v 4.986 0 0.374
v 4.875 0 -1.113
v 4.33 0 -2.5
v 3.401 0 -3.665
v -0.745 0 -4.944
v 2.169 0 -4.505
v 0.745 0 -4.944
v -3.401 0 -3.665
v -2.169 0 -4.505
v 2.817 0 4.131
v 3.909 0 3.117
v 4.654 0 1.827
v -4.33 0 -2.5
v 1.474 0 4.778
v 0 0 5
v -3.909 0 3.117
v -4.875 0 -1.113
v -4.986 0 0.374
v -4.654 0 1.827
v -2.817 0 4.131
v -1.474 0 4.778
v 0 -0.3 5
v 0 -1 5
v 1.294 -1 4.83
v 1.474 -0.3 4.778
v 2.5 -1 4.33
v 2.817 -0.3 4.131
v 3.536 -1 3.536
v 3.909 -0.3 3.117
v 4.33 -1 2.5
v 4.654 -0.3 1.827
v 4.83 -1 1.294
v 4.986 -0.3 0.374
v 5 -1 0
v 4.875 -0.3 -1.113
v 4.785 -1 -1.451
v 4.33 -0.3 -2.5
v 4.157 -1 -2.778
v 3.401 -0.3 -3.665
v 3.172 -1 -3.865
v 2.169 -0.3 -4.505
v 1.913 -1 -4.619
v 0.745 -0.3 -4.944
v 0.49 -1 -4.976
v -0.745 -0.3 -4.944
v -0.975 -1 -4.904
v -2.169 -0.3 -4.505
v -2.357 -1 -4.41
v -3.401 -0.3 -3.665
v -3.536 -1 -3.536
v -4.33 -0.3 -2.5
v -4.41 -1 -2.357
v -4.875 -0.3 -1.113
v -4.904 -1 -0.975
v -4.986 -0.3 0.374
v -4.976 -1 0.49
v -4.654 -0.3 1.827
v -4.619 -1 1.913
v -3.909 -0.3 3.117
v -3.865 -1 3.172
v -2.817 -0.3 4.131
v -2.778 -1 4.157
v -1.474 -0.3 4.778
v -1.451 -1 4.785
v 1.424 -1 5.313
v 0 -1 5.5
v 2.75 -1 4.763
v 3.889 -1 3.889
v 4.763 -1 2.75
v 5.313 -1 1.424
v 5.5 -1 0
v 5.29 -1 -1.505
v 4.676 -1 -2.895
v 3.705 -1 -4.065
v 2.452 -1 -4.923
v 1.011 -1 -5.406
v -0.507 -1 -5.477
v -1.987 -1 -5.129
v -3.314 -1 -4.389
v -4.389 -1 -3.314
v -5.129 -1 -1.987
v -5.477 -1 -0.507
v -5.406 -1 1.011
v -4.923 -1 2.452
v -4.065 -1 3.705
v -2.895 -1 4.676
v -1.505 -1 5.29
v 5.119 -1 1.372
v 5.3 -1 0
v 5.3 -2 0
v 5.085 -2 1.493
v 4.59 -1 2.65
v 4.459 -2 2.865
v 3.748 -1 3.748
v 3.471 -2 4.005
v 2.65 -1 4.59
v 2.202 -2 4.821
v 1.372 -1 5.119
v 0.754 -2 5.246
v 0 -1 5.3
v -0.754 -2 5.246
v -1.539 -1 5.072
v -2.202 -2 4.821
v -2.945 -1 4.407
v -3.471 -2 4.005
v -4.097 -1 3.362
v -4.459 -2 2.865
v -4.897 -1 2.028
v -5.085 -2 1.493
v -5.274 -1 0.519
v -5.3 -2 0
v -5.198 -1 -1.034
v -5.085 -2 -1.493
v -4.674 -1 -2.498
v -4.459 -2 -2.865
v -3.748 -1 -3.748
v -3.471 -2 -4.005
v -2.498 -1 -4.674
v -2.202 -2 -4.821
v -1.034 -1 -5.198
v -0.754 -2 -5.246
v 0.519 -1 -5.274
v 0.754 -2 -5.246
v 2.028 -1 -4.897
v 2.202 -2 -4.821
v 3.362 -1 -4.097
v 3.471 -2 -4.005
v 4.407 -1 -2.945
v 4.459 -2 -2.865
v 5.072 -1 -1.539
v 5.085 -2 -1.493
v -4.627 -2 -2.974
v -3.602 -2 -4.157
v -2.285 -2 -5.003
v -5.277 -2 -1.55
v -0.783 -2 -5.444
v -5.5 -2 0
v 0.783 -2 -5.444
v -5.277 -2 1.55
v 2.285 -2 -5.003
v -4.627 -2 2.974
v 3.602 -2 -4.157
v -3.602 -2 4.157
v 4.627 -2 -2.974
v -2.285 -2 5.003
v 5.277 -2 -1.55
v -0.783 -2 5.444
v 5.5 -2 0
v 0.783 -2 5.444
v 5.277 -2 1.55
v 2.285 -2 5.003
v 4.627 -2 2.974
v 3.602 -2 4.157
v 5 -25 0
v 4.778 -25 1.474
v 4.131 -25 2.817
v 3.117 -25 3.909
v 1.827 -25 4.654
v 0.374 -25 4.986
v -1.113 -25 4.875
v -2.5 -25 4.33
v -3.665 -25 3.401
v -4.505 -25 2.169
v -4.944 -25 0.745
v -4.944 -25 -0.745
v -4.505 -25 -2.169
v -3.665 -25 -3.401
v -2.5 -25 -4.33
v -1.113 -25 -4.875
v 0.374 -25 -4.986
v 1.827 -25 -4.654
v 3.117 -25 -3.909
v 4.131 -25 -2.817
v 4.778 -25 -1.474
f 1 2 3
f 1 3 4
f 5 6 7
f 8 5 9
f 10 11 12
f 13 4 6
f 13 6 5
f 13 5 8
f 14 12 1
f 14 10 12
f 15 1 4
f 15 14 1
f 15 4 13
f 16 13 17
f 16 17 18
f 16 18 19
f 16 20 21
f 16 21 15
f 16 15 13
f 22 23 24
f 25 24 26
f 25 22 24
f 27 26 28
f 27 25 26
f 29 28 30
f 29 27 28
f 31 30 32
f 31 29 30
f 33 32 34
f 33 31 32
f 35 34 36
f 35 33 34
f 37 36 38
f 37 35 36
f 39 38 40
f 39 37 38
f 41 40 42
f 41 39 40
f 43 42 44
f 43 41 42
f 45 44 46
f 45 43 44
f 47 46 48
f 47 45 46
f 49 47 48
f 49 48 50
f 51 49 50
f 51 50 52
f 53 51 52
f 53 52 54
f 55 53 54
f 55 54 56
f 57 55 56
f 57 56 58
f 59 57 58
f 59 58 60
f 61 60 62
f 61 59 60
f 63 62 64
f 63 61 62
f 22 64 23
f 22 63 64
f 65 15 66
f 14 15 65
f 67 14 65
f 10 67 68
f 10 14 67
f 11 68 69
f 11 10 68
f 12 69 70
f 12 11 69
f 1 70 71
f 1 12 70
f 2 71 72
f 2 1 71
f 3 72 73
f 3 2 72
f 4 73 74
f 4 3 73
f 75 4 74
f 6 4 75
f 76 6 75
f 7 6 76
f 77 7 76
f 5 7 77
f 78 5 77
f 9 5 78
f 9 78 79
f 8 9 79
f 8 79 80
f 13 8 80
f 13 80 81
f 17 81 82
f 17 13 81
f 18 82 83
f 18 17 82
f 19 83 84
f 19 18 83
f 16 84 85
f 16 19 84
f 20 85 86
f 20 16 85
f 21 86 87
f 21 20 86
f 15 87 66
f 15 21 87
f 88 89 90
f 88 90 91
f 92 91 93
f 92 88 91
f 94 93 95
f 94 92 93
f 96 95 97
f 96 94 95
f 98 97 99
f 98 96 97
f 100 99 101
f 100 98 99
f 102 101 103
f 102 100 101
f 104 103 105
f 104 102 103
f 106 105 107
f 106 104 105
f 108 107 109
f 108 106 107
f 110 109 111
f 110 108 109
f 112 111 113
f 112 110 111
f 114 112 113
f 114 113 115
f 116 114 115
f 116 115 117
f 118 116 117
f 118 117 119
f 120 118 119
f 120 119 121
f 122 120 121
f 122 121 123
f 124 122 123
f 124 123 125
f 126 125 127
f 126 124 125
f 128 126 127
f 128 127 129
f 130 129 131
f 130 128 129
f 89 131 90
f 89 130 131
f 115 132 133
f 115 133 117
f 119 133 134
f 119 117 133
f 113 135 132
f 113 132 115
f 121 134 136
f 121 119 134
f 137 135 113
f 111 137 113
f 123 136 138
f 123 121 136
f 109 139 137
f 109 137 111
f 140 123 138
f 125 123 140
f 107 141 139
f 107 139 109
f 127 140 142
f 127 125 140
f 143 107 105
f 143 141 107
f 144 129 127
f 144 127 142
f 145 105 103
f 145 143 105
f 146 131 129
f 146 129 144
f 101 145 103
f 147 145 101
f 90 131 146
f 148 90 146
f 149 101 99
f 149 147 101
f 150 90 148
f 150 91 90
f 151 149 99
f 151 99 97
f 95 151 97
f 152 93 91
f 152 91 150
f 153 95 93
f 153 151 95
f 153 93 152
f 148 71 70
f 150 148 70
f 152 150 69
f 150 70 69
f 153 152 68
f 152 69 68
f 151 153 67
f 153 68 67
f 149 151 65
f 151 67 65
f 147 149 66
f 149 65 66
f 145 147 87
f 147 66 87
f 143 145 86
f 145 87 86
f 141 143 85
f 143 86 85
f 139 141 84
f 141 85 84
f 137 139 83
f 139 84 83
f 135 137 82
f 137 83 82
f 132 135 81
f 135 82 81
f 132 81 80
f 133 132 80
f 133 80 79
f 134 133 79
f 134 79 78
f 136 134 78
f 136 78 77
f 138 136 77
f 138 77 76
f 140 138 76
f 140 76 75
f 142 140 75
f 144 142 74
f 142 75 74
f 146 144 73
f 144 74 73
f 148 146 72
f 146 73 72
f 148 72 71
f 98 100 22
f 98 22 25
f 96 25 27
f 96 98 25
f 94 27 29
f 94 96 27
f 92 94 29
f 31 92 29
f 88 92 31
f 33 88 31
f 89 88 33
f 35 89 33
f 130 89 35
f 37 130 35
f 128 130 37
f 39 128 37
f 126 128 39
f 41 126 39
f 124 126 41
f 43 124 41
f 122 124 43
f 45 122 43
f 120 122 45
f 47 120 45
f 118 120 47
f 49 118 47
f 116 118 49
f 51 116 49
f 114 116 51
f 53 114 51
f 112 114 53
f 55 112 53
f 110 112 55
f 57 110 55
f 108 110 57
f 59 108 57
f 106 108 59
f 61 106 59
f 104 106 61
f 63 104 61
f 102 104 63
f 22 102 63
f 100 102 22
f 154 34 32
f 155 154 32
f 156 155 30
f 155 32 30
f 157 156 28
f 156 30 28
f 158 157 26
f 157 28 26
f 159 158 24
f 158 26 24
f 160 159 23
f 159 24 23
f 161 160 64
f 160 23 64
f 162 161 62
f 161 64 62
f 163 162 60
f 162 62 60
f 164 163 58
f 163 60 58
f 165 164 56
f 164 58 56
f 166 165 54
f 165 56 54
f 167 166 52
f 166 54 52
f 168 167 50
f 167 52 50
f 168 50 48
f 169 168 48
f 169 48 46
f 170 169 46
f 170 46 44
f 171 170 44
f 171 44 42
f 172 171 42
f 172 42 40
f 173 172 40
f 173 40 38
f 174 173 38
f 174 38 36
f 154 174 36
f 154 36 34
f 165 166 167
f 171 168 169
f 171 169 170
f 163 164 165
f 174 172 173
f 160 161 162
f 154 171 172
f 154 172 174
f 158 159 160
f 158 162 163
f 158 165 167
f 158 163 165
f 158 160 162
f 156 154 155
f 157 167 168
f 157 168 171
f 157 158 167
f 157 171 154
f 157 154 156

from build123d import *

# Parameters (mm, degrees)
F0_R     = 5
F1_DEPTH = 25
F2_R     = 5.5
F3_DEPTH = 1
F8_R     = 5.5
F8_R_2   = 5.3
F9_DEPTH = 1


with BuildPart() as f1:
    # F0 (on Front) → F1 (new body)
    with BuildSketch(Plane.XZ):
        Circle(F0_R)
    extrude(amount=F1_DEPTH)

    # F2 (on face) → F3 (join)
    with BuildSketch(Plane(origin=(0, 0, 0), x_dir=(-1, 0, 0), z_dir=(0, 1, 0))):
        Circle(F2_R)
    extrude(amount=-F3_DEPTH)

    # F4 (on Right) → F5 (revolve, cut)
    with BuildSketch(Plane.YZ):
        Polygon((0, 5.5), (-1, 5.5), (0, 5), align=None)
    revolve(axis=Axis((0, -11.148525, 0), (0, 1, 0)), mode=Mode.SUBTRACT)

    # F6 (on Right) → F7 (revolve, cut)
    with BuildSketch(Plane.YZ):
        Polygon((-1, 5), (-0.3, 5), (-1, 5.3), align=None)
    revolve(axis=Axis((0, -11.529621, 0), (0, 1, 0)), mode=Mode.SUBTRACT)

    # F8 (on face) → F9 (join)
    with BuildSketch(Plane.XZ.offset(1)):
        Circle(F8_R)
        Circle(F8_R_2, mode=Mode.SUBTRACT)
    extrude(amount=F9_DEPTH)


solid = f1.part
